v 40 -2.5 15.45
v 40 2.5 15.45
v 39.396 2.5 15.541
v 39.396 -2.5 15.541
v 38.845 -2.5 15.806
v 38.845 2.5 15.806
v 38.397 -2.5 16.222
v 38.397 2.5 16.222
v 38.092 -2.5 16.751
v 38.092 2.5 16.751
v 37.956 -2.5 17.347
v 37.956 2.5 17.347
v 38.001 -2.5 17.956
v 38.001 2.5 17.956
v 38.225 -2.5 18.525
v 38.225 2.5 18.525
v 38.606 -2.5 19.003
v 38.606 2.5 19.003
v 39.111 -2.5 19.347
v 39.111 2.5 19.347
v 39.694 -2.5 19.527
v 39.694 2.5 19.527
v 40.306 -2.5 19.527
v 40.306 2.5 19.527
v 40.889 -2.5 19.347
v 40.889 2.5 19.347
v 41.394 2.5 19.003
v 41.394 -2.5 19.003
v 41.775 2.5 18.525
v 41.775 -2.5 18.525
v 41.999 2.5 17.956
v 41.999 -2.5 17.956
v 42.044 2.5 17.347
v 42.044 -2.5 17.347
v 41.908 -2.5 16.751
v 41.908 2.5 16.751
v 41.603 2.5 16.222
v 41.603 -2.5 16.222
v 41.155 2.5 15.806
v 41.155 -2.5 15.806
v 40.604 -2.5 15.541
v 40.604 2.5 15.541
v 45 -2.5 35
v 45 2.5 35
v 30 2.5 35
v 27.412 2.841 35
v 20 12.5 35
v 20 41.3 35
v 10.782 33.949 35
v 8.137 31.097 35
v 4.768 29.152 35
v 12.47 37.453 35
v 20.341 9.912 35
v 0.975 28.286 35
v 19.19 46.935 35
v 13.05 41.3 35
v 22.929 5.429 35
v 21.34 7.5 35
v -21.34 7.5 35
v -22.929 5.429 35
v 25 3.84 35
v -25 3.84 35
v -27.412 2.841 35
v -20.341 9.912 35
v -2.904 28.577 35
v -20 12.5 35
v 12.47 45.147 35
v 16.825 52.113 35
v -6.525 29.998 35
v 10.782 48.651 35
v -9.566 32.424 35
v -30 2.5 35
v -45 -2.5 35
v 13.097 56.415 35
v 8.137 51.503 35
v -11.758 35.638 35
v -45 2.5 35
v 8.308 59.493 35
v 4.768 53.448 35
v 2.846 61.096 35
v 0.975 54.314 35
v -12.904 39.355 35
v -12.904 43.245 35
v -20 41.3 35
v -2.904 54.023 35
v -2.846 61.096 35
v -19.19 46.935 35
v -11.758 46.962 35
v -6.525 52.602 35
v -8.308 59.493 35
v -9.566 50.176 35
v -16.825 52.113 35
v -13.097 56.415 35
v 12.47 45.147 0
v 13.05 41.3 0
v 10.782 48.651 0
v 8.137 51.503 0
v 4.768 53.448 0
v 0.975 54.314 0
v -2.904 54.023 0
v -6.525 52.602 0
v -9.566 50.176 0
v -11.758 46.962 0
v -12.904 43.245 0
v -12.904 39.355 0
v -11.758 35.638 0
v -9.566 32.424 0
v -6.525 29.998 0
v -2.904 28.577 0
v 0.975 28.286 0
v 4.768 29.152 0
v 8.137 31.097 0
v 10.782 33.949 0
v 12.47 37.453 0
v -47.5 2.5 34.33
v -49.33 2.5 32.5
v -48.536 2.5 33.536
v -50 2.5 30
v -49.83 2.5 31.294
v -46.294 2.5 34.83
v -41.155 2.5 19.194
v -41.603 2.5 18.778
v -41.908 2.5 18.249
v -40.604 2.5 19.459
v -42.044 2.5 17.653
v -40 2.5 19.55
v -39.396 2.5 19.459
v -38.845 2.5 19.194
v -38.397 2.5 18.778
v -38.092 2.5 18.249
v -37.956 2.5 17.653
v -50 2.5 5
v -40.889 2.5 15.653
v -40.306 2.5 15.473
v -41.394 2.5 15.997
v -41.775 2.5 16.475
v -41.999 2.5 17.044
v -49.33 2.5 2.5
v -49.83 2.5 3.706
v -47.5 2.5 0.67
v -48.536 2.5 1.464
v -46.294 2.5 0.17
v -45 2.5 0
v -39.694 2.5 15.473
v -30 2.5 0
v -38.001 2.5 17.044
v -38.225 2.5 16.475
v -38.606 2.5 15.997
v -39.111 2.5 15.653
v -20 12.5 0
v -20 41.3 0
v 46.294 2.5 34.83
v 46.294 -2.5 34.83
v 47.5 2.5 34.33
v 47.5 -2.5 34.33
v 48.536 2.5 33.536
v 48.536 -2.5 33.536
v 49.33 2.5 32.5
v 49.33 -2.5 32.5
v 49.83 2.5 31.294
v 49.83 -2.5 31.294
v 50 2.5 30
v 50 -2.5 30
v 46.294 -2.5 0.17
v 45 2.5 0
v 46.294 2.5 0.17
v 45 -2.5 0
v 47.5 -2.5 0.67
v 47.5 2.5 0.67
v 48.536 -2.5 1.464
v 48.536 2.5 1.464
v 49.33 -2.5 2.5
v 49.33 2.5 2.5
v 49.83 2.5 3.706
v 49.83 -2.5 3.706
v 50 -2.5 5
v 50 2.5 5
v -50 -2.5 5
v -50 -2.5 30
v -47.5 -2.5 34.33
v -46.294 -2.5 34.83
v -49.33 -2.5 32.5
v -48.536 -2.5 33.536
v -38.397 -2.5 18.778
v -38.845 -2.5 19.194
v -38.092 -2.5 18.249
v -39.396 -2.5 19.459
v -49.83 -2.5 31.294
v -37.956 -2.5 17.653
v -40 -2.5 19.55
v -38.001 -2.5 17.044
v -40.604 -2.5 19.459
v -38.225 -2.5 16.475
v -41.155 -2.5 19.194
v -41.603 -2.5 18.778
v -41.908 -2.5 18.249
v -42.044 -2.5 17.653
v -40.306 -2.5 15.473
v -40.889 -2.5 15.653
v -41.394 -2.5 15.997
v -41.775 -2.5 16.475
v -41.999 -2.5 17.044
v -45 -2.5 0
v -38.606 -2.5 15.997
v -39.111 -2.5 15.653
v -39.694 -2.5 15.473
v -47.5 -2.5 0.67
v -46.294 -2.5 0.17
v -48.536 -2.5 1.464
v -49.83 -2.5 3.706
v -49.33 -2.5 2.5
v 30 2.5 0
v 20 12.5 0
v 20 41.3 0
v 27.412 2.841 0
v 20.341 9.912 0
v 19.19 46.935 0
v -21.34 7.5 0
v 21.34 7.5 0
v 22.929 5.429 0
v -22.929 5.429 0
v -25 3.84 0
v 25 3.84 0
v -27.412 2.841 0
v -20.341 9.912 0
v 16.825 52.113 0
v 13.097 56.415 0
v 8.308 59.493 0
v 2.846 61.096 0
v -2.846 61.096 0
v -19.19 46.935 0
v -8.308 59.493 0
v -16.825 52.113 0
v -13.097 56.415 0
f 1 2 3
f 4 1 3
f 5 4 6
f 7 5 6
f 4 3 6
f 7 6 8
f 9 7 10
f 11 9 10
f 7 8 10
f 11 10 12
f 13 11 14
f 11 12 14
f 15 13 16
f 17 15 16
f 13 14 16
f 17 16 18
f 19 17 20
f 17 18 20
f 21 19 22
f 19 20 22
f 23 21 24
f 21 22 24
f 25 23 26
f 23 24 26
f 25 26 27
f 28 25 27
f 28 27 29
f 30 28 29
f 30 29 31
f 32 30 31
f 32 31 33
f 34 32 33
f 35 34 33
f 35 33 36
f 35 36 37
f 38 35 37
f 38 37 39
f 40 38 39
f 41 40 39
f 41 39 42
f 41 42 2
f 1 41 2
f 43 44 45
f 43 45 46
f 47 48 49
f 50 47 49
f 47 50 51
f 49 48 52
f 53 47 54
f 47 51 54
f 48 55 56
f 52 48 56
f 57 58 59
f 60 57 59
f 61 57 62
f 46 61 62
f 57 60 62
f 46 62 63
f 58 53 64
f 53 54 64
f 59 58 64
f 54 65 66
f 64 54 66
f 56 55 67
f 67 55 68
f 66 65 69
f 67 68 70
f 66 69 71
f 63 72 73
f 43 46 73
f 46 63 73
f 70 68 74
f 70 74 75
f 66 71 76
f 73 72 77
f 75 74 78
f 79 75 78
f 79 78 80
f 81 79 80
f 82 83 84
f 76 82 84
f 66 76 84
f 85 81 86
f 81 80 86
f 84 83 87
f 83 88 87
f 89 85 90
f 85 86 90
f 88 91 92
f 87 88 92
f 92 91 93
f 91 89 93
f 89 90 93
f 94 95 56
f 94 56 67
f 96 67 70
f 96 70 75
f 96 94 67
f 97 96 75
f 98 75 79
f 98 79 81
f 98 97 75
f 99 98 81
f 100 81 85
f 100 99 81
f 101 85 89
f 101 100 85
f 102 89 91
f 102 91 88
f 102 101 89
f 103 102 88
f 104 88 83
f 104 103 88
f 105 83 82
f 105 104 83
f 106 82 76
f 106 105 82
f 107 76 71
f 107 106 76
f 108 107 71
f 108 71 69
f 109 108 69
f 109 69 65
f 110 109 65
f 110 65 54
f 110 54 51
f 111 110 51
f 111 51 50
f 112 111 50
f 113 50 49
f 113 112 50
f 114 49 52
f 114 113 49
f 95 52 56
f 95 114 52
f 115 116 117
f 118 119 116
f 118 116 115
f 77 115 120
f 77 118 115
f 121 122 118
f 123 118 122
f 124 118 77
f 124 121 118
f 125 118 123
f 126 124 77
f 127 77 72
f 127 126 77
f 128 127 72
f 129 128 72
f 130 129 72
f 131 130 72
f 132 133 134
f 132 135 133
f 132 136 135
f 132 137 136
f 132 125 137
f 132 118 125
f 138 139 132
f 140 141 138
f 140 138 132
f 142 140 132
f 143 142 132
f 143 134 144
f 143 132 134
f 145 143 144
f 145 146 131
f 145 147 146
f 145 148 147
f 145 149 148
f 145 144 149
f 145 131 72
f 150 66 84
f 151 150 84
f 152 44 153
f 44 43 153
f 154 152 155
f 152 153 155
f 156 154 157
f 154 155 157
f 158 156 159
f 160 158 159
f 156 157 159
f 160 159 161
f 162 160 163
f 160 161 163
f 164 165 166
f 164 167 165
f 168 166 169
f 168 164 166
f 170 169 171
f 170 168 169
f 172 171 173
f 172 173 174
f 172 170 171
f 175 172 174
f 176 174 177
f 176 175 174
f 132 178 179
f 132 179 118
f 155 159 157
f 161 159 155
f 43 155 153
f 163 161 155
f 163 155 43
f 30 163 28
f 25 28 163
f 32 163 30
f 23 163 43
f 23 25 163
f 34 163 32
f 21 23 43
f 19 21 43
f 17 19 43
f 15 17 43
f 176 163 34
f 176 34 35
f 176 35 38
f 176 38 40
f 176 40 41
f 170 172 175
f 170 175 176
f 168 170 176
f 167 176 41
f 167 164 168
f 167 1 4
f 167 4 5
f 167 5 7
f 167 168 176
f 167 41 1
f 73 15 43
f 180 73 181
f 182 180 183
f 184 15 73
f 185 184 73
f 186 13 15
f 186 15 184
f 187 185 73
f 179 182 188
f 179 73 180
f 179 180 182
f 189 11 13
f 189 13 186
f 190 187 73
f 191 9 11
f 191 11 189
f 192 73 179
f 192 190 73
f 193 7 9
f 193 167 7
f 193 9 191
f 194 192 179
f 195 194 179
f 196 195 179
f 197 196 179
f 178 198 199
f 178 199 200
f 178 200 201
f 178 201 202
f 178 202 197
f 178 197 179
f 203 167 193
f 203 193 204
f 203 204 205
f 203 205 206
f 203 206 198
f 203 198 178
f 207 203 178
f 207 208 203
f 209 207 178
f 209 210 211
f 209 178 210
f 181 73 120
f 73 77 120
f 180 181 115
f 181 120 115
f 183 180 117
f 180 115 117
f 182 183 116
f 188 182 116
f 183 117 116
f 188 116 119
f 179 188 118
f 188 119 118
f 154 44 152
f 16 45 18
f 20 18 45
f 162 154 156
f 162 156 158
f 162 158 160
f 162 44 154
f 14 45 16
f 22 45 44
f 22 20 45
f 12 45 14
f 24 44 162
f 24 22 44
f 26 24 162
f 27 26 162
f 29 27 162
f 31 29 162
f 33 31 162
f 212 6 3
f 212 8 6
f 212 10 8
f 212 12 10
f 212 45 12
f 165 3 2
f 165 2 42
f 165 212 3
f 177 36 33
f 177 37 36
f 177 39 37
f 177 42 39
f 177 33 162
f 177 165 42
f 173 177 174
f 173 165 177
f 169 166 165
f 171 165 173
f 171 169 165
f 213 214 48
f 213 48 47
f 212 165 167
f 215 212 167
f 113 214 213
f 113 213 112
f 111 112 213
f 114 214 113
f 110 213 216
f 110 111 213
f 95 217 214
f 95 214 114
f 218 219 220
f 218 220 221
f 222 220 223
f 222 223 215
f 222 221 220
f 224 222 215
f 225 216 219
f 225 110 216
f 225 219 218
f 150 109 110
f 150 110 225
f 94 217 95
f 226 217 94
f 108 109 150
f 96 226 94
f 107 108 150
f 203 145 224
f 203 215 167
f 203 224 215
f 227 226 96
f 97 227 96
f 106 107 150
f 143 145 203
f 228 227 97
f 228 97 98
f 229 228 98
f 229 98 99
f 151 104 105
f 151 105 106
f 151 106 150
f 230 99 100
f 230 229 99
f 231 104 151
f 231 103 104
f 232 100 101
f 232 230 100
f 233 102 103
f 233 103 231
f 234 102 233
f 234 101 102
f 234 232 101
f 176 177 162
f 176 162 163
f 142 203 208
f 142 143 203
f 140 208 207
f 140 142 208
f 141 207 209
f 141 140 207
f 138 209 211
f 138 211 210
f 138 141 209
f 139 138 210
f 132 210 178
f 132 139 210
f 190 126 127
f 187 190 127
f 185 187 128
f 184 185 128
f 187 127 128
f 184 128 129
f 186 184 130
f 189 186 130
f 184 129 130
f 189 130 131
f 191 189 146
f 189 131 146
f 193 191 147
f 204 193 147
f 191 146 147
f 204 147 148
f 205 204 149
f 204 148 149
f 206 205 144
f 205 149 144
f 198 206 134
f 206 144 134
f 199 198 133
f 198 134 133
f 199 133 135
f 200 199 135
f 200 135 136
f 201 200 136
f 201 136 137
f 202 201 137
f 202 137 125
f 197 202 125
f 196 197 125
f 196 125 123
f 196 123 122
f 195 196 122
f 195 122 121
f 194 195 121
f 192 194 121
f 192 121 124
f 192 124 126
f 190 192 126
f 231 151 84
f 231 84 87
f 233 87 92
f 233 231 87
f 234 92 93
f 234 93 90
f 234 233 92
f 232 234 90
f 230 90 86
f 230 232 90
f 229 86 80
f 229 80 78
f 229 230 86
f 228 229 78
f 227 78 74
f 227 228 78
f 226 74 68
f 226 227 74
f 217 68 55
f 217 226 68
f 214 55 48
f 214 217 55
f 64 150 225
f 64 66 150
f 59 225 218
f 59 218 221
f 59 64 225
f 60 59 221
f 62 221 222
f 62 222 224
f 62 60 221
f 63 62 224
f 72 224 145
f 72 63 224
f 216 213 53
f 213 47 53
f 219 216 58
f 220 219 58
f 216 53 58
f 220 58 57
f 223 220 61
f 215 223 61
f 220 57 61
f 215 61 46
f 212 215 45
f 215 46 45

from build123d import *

# Parameters (mm, degrees)
CROQUIS1_R              = 13.05
SALIENTE_EXTRUIR1_DEPTH = 35
REDONDEO1_R             = 10
REDONDEO2_R             = 5
CROQUIS2_R              = 2.05
CORTAR_EXTRUIR1_DEPTH   = 85.749277283


with BuildPart() as part:
    # Croquis1 → Saliente-Extruir1 (new body)
    with BuildSketch(Plane.XY):
        with BuildLine():
            Line((-20, 2.5), (-20, 41.3))
            ThreePointArc((-20, 41.3), (0, 61.3), (20, 41.3))
            Line((20, 41.3), (20, 2.5))
            Line((20, 2.5), (50, 2.5))
            Line((50, 2.5), (50, -2.5))
            Line((50, -2.5), (-50, -2.5))
            Line((-50, -2.5), (-50, 2.5))
            Line((-50, 2.5), (-20, 2.5))
        make_face()
        with Locations((0, 41.3)):
            Circle(CROQUIS1_R, mode=Mode.SUBTRACT)
    extrude(amount=SALIENTE_EXTRUIR1_DEPTH)

    # Redondeo1
    redondeo1_edges = [part.edges().sort_by_distance(p)[0] for p in [
        (20, 2.5, 17.5),
        (-20, 2.5, 17.5),
    ]]
    fillet(redondeo1_edges, radius=REDONDEO1_R)

    # Redondeo2
    redondeo2_edges = [part.edges().sort_by_distance(p)[0] for p in [
        (50, 0, 0),
        (-50, 0, 0),
        (-50, 0, 35),
        (50, 0, 35),
    ]]
    fillet(redondeo2_edges, radius=REDONDEO2_R)

    # Croquis2 → Cortar-Extruir1 (cut, through all)
    with BuildSketch(Plane(origin=(0, 2.5, 0), x_dir=(1, 0, 0), z_dir=(0, 1, 0))):
        with Locations(Location((-40, -17.5, 0), (0, 0, 270))):
            Circle(CROQUIS2_R)
        with Locations(Location((40, -17.5, 0), (0, 0, 90))):
            Circle(CROQUIS2_R)
    extrude(amount=-CORTAR_EXTRUIR1_DEPTH, mode=Mode.SUBTRACT)


solid = part.part
